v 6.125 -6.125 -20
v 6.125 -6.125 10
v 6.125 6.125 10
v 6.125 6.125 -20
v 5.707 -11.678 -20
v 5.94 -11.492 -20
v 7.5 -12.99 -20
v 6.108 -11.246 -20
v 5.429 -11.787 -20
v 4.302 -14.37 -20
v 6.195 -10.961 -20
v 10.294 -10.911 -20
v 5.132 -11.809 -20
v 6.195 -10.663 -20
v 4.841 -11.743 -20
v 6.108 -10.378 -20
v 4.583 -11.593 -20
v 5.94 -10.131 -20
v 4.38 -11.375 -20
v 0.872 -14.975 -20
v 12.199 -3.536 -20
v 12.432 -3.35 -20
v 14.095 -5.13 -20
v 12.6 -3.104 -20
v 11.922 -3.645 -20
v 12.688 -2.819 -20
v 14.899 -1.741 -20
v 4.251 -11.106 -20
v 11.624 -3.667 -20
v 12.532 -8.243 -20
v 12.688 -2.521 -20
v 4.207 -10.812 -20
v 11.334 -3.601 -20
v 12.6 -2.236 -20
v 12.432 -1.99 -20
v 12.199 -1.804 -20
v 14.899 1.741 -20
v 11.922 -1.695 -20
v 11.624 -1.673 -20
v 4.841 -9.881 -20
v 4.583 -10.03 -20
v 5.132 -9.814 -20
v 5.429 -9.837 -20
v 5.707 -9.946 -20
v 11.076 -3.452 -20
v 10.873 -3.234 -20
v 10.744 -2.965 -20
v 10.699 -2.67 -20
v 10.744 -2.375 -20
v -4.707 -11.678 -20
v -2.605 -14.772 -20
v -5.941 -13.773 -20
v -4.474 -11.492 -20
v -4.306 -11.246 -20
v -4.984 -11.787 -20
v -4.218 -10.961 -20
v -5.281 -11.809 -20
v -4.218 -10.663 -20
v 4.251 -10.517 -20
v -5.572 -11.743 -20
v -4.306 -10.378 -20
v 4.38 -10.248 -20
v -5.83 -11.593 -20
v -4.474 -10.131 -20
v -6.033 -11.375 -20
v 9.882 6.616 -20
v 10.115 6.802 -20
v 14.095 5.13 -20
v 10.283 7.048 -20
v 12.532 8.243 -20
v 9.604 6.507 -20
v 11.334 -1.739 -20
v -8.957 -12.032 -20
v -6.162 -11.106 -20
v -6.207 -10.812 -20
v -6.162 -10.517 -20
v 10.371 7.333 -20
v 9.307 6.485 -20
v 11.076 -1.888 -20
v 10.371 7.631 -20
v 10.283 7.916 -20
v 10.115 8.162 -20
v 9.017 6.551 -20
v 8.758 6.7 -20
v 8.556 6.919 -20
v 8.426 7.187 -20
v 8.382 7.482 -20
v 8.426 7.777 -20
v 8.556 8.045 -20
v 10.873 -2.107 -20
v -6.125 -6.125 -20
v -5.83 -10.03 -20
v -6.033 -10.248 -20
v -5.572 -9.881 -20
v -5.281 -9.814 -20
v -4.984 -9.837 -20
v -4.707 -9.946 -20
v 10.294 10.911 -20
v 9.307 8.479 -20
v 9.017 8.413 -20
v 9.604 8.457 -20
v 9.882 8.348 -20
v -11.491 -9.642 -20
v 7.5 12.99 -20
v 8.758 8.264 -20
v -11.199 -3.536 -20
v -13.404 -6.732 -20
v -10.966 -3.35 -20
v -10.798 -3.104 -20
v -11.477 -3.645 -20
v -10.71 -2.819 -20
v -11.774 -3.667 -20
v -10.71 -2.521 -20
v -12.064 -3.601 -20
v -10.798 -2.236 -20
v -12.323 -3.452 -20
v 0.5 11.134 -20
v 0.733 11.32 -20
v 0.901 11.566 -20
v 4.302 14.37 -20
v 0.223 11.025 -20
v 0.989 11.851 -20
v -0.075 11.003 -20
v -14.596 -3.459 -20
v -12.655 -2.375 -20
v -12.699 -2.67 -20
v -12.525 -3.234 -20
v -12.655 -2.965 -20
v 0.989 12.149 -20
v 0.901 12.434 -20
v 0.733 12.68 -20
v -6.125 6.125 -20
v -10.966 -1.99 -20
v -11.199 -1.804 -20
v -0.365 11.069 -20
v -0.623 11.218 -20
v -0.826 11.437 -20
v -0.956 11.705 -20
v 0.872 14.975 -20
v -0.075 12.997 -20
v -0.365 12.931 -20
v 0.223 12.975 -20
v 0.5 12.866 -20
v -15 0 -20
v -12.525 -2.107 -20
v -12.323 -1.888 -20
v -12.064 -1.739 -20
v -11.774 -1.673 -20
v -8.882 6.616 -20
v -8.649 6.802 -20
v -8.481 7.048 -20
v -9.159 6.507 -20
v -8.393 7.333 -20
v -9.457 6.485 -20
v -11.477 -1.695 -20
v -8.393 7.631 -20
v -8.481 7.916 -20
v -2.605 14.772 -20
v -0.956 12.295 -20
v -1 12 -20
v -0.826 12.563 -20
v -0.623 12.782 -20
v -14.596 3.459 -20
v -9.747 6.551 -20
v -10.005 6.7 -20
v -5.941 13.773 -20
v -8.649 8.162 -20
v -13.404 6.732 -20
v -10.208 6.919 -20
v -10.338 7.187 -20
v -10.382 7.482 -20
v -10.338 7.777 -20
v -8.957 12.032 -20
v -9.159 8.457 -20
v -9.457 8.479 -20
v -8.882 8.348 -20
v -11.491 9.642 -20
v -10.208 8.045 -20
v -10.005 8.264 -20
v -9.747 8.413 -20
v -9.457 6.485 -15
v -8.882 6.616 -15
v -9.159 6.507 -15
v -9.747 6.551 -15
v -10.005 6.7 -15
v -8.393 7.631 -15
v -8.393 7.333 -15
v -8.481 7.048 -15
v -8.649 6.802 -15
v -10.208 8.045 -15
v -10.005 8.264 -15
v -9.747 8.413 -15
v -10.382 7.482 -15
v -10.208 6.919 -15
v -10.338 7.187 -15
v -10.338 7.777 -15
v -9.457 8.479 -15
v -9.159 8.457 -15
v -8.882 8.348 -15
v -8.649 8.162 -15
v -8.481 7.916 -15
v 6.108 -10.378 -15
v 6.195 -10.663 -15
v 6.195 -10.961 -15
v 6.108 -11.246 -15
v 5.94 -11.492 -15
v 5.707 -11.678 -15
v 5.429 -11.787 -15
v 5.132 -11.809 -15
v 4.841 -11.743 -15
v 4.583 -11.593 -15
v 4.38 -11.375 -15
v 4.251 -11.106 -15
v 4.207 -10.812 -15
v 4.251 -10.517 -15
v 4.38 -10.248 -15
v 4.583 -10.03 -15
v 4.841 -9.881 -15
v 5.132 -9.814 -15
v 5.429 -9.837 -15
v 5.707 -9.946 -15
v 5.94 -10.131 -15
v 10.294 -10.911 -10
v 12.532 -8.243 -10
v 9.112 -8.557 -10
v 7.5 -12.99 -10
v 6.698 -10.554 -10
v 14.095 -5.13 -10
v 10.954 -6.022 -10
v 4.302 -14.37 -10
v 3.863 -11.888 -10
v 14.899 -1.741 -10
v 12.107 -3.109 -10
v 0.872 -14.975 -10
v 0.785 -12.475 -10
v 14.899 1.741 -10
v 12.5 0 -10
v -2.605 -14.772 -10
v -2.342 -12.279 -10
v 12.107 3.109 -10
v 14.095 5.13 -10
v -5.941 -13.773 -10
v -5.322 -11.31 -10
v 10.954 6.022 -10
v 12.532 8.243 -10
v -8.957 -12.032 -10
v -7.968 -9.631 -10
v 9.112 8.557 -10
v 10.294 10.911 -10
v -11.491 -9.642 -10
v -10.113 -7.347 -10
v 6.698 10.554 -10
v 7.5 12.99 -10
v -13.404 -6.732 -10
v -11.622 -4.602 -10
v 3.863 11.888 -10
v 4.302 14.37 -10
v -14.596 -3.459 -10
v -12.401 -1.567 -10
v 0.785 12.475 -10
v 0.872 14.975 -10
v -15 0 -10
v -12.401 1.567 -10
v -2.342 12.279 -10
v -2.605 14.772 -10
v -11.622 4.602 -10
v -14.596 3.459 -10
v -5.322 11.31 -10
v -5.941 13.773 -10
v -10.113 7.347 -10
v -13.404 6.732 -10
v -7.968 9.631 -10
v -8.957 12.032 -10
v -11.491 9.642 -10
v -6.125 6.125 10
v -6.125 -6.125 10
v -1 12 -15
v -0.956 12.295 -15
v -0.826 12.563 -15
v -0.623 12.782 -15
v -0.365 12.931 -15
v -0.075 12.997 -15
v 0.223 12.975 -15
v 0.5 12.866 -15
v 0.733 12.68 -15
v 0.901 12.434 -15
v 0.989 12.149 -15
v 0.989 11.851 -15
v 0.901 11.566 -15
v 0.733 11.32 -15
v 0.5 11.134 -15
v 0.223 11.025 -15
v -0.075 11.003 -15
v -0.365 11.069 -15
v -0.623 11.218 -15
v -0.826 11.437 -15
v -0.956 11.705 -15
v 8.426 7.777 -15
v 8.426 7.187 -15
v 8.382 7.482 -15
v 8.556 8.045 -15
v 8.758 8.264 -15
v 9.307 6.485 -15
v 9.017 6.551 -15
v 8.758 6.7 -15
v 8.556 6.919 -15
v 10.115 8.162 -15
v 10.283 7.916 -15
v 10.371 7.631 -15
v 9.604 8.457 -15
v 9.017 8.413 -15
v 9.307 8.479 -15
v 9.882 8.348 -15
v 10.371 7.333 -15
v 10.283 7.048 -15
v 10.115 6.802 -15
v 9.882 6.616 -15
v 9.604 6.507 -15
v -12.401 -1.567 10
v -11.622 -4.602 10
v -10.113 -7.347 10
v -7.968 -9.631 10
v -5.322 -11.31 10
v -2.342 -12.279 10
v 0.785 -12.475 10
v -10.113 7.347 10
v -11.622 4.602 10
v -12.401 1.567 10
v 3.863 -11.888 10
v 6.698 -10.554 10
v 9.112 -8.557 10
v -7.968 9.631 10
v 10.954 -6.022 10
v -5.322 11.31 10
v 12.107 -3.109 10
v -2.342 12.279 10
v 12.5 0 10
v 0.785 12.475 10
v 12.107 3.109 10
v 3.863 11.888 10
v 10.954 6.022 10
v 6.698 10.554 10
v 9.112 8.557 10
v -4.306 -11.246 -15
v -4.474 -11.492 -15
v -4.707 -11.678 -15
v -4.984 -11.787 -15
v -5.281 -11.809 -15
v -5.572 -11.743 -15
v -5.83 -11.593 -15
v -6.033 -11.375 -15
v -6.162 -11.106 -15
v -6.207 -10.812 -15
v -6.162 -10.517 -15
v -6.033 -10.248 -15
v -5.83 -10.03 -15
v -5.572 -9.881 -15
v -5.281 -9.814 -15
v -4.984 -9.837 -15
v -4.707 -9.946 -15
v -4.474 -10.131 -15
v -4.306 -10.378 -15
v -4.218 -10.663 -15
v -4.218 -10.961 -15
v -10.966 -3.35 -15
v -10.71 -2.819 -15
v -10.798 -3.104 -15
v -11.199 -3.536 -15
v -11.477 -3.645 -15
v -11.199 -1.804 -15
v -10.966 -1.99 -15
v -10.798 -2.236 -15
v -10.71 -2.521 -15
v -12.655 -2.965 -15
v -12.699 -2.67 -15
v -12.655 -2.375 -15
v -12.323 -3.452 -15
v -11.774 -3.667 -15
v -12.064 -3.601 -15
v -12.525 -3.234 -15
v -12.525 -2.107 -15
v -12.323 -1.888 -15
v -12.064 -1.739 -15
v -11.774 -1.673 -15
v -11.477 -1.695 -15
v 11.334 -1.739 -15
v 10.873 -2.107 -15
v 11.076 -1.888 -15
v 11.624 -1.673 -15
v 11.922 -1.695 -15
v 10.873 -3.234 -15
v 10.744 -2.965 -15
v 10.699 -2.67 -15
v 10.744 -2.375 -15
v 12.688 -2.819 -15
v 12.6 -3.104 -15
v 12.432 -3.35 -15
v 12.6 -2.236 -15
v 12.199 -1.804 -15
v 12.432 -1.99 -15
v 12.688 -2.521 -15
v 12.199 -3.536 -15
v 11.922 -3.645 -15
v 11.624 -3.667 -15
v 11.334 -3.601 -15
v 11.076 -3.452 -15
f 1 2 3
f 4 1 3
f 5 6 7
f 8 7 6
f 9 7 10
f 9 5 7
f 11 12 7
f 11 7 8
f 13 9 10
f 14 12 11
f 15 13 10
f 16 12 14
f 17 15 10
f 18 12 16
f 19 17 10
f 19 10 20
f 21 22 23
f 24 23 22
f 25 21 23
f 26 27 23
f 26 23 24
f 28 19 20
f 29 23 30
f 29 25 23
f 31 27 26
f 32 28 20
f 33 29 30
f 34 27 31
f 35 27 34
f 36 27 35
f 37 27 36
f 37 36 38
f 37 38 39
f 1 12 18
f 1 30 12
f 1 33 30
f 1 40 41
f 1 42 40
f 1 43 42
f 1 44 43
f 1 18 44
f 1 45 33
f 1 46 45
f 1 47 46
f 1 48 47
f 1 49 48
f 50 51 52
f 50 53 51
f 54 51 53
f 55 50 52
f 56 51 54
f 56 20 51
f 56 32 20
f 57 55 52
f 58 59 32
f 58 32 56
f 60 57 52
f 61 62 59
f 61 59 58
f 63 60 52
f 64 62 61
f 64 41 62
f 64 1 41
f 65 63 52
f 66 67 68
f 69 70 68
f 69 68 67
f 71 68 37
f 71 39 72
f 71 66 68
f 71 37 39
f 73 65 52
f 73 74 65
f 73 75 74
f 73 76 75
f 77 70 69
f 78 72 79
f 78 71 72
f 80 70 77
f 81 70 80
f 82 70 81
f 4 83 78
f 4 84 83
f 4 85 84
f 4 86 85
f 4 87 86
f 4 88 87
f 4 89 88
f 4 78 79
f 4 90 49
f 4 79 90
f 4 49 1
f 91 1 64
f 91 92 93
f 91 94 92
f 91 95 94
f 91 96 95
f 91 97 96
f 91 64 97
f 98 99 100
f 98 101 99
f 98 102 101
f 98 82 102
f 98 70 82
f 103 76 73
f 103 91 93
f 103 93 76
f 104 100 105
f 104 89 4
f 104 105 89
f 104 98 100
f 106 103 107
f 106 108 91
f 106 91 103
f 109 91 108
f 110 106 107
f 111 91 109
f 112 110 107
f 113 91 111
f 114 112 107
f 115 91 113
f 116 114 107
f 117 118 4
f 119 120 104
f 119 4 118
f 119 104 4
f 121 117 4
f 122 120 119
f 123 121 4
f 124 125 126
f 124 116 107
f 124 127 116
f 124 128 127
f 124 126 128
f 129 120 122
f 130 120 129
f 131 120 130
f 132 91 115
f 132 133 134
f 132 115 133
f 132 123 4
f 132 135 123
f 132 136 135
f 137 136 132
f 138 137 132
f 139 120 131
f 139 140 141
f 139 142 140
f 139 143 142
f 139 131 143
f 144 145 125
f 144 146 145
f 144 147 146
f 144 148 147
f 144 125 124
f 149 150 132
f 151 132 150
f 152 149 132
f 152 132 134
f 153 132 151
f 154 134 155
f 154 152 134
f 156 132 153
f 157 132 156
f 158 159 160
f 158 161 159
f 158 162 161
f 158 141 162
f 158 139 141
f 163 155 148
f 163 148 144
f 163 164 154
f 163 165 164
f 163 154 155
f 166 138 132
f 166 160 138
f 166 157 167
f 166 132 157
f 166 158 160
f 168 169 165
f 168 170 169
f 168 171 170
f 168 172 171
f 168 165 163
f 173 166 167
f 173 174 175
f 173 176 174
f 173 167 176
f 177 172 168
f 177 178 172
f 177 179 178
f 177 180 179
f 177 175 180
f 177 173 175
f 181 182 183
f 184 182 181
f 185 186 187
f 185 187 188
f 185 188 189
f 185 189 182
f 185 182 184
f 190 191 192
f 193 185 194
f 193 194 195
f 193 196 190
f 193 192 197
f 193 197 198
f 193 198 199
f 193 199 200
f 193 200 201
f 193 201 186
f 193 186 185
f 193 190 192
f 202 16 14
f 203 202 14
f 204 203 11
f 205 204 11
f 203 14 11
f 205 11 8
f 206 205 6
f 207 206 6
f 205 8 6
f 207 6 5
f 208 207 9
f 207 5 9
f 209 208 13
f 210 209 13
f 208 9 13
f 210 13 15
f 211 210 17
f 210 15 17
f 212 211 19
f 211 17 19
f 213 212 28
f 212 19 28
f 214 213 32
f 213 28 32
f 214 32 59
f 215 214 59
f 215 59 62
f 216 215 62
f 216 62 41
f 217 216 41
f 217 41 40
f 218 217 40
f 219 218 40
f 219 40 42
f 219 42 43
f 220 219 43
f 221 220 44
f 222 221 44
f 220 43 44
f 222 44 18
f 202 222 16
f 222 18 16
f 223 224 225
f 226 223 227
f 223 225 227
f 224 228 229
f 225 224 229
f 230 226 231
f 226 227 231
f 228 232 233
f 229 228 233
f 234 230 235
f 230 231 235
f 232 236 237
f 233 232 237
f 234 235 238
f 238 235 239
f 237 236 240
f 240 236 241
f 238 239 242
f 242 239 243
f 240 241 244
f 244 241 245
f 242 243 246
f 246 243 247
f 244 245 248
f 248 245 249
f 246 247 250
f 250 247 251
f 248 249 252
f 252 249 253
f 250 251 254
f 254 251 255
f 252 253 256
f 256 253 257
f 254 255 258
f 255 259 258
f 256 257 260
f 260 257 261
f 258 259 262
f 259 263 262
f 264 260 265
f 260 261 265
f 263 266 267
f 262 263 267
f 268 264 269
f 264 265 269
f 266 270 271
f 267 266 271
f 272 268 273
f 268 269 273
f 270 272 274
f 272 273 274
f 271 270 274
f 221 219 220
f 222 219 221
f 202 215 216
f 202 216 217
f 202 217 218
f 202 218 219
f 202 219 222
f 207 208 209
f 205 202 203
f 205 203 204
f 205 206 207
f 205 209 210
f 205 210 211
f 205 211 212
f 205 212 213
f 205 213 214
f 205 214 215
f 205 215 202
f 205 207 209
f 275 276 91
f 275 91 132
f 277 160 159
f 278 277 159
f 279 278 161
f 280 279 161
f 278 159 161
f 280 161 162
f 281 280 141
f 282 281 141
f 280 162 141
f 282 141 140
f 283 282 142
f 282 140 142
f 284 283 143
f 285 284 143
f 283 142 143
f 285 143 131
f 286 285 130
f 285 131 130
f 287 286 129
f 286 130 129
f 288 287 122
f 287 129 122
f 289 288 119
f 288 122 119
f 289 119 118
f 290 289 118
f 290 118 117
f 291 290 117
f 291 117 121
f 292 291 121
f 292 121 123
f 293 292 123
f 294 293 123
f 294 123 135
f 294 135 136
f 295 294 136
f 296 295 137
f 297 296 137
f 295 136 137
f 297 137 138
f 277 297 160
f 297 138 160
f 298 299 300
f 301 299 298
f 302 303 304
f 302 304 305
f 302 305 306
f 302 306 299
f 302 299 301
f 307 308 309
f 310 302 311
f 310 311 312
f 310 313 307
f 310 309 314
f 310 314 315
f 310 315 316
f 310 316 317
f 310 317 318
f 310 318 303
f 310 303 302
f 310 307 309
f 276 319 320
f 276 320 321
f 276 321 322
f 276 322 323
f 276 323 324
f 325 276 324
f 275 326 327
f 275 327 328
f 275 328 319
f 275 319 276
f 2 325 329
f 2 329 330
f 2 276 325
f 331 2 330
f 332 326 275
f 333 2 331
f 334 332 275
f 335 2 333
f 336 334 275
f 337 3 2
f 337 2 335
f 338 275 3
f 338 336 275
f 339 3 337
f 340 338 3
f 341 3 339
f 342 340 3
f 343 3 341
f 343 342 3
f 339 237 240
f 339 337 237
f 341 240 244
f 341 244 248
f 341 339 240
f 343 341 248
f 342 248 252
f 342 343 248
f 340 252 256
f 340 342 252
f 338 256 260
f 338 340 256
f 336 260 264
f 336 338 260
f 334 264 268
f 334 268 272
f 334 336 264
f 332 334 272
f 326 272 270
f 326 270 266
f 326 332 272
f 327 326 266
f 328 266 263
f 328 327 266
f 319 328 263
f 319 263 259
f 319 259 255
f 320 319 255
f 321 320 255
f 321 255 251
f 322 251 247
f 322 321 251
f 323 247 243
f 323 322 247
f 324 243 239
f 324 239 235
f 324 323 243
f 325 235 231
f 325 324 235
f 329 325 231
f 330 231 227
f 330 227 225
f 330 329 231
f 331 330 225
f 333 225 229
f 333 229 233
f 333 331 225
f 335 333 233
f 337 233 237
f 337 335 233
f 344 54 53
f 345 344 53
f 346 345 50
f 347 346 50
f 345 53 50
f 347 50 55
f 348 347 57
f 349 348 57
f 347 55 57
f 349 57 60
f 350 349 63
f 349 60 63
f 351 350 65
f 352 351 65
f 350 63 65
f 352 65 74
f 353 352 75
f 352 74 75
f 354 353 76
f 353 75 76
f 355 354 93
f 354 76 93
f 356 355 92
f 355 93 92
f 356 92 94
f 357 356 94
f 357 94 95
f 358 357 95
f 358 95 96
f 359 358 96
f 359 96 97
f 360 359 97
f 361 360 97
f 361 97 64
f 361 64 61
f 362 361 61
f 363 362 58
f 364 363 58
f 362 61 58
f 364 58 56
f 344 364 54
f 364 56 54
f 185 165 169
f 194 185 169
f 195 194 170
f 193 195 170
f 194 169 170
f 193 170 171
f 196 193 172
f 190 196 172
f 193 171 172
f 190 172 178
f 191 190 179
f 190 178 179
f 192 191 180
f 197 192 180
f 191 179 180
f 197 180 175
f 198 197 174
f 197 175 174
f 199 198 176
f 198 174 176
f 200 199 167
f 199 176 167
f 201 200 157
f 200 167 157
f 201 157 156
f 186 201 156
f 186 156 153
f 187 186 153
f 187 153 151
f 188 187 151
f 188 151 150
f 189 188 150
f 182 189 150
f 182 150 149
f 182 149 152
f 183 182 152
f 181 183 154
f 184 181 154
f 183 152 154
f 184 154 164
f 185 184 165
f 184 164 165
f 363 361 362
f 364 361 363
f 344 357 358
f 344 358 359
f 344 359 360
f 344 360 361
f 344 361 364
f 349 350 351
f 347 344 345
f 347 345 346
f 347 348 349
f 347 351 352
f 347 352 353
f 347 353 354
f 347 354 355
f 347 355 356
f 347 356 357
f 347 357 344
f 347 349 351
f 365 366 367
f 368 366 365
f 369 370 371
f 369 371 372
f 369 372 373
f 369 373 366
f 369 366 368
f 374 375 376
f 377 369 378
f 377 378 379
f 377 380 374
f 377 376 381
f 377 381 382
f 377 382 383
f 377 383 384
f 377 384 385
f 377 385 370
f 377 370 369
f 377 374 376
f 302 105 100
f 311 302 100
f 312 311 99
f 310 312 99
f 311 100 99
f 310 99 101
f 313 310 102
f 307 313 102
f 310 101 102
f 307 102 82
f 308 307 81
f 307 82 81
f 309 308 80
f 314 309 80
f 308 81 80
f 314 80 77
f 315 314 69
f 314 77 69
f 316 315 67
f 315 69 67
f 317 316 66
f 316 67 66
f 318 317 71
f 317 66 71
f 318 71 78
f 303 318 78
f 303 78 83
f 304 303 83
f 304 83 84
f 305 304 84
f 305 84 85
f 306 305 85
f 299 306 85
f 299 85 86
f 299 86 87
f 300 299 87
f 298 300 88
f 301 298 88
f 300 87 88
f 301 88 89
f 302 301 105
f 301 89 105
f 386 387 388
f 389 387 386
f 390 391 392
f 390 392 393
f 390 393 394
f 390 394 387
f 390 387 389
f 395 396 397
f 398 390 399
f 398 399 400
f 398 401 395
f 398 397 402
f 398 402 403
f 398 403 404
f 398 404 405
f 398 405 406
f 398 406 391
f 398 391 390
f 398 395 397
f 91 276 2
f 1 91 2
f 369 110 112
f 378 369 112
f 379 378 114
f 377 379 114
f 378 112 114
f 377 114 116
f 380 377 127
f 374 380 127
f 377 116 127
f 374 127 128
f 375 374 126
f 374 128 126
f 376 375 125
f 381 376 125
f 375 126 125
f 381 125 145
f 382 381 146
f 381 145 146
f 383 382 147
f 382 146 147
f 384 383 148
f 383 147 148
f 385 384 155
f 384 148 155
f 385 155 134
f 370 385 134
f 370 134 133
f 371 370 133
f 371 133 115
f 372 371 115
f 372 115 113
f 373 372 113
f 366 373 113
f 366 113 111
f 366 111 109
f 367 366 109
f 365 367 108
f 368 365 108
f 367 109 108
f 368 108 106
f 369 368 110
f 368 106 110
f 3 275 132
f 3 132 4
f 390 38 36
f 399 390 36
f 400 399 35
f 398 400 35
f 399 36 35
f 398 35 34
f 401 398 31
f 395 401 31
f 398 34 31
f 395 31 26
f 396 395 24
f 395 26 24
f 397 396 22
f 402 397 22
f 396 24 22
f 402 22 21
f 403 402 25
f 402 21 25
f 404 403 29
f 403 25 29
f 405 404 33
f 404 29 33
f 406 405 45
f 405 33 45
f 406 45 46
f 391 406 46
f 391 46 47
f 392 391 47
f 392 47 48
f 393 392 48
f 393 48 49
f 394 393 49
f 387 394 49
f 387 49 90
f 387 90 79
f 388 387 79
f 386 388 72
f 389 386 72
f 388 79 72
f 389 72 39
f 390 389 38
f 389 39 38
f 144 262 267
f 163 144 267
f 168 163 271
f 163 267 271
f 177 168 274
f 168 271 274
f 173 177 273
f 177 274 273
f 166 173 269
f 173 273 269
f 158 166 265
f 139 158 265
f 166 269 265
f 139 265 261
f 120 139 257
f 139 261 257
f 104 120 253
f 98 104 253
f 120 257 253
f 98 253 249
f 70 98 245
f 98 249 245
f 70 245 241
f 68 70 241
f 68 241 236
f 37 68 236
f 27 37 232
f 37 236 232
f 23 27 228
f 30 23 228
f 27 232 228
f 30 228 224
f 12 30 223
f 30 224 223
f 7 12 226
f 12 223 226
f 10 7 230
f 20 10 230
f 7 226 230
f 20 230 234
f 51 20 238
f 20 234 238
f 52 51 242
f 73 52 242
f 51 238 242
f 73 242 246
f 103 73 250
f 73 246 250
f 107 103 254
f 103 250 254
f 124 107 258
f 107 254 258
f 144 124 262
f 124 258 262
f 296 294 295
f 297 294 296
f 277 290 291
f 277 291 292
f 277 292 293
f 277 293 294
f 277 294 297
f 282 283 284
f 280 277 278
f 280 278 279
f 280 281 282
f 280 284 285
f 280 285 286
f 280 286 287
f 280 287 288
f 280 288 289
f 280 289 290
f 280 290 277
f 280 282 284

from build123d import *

# Parameters (mm, degrees)
SKETCH1_R           = 12.5
BOSS_EXTRUDE1_DEPTH = 10
SKETCH11_R          = 15
BOSS_EXTRUDE2_DEPTH = 10
SKETCH8_W           = 12.25
SKETCH8_H           = 12.25
CUT_EXTRUDE1_DEPTH  = 37.742346142
SKETCH12_R          = 1
CUT_EXTRUDE2_DEPTH  = 5
CIRPATTERN1_COUNT   = 7


with BuildPart() as part:
    # Sketch1 → Boss-Extrude1 (new, symmetric)
    with BuildSketch(Plane.XY):
        Circle(SKETCH1_R)
    extrude(amount=BOSS_EXTRUDE1_DEPTH, both=True)

    # Sketch11 → Boss-Extrude2 (add)
    with BuildSketch(Plane(origin=(0, 0, -10), x_dir=(-1, 0, 0), z_dir=(0, 0, -1))):
        Circle(SKETCH11_R)
    extrude(amount=BOSS_EXTRUDE2_DEPTH)

    # Sketch8 → Cut-Extrude1 (cut, through all)
    with BuildSketch(Plane.XY.offset(10)):
        Rectangle(SKETCH8_W, SKETCH8_H)
    extrude(amount=-CUT_EXTRUDE1_DEPTH, mode=Mode.SUBTRACT)

    # Sketch12 → Cut-Extrude2 (cut)
    with BuildSketch(Plane(origin=(0, 0, -20), x_dir=(-1, 0, 0), z_dir=(0, 0, -1))):
        with Locations((0, 12.00000002)):
            Circle(SKETCH12_R)
    cut_extrude2 = extrude(amount=-CUT_EXTRUDE2_DEPTH, mode=Mode.SUBTRACT)

    # CirPattern1: Cut-Extrude2 ×7 about axis
    cirpattern1_axis = Axis((0, 0, 0), (0, 0, 1))
    for i in range(1, CIRPATTERN1_COUNT):
        add(cut_extrude2.rotate(cirpattern1_axis, i * 360 / CIRPATTERN1_COUNT), mode=Mode.SUBTRACT)


solid = part.part
